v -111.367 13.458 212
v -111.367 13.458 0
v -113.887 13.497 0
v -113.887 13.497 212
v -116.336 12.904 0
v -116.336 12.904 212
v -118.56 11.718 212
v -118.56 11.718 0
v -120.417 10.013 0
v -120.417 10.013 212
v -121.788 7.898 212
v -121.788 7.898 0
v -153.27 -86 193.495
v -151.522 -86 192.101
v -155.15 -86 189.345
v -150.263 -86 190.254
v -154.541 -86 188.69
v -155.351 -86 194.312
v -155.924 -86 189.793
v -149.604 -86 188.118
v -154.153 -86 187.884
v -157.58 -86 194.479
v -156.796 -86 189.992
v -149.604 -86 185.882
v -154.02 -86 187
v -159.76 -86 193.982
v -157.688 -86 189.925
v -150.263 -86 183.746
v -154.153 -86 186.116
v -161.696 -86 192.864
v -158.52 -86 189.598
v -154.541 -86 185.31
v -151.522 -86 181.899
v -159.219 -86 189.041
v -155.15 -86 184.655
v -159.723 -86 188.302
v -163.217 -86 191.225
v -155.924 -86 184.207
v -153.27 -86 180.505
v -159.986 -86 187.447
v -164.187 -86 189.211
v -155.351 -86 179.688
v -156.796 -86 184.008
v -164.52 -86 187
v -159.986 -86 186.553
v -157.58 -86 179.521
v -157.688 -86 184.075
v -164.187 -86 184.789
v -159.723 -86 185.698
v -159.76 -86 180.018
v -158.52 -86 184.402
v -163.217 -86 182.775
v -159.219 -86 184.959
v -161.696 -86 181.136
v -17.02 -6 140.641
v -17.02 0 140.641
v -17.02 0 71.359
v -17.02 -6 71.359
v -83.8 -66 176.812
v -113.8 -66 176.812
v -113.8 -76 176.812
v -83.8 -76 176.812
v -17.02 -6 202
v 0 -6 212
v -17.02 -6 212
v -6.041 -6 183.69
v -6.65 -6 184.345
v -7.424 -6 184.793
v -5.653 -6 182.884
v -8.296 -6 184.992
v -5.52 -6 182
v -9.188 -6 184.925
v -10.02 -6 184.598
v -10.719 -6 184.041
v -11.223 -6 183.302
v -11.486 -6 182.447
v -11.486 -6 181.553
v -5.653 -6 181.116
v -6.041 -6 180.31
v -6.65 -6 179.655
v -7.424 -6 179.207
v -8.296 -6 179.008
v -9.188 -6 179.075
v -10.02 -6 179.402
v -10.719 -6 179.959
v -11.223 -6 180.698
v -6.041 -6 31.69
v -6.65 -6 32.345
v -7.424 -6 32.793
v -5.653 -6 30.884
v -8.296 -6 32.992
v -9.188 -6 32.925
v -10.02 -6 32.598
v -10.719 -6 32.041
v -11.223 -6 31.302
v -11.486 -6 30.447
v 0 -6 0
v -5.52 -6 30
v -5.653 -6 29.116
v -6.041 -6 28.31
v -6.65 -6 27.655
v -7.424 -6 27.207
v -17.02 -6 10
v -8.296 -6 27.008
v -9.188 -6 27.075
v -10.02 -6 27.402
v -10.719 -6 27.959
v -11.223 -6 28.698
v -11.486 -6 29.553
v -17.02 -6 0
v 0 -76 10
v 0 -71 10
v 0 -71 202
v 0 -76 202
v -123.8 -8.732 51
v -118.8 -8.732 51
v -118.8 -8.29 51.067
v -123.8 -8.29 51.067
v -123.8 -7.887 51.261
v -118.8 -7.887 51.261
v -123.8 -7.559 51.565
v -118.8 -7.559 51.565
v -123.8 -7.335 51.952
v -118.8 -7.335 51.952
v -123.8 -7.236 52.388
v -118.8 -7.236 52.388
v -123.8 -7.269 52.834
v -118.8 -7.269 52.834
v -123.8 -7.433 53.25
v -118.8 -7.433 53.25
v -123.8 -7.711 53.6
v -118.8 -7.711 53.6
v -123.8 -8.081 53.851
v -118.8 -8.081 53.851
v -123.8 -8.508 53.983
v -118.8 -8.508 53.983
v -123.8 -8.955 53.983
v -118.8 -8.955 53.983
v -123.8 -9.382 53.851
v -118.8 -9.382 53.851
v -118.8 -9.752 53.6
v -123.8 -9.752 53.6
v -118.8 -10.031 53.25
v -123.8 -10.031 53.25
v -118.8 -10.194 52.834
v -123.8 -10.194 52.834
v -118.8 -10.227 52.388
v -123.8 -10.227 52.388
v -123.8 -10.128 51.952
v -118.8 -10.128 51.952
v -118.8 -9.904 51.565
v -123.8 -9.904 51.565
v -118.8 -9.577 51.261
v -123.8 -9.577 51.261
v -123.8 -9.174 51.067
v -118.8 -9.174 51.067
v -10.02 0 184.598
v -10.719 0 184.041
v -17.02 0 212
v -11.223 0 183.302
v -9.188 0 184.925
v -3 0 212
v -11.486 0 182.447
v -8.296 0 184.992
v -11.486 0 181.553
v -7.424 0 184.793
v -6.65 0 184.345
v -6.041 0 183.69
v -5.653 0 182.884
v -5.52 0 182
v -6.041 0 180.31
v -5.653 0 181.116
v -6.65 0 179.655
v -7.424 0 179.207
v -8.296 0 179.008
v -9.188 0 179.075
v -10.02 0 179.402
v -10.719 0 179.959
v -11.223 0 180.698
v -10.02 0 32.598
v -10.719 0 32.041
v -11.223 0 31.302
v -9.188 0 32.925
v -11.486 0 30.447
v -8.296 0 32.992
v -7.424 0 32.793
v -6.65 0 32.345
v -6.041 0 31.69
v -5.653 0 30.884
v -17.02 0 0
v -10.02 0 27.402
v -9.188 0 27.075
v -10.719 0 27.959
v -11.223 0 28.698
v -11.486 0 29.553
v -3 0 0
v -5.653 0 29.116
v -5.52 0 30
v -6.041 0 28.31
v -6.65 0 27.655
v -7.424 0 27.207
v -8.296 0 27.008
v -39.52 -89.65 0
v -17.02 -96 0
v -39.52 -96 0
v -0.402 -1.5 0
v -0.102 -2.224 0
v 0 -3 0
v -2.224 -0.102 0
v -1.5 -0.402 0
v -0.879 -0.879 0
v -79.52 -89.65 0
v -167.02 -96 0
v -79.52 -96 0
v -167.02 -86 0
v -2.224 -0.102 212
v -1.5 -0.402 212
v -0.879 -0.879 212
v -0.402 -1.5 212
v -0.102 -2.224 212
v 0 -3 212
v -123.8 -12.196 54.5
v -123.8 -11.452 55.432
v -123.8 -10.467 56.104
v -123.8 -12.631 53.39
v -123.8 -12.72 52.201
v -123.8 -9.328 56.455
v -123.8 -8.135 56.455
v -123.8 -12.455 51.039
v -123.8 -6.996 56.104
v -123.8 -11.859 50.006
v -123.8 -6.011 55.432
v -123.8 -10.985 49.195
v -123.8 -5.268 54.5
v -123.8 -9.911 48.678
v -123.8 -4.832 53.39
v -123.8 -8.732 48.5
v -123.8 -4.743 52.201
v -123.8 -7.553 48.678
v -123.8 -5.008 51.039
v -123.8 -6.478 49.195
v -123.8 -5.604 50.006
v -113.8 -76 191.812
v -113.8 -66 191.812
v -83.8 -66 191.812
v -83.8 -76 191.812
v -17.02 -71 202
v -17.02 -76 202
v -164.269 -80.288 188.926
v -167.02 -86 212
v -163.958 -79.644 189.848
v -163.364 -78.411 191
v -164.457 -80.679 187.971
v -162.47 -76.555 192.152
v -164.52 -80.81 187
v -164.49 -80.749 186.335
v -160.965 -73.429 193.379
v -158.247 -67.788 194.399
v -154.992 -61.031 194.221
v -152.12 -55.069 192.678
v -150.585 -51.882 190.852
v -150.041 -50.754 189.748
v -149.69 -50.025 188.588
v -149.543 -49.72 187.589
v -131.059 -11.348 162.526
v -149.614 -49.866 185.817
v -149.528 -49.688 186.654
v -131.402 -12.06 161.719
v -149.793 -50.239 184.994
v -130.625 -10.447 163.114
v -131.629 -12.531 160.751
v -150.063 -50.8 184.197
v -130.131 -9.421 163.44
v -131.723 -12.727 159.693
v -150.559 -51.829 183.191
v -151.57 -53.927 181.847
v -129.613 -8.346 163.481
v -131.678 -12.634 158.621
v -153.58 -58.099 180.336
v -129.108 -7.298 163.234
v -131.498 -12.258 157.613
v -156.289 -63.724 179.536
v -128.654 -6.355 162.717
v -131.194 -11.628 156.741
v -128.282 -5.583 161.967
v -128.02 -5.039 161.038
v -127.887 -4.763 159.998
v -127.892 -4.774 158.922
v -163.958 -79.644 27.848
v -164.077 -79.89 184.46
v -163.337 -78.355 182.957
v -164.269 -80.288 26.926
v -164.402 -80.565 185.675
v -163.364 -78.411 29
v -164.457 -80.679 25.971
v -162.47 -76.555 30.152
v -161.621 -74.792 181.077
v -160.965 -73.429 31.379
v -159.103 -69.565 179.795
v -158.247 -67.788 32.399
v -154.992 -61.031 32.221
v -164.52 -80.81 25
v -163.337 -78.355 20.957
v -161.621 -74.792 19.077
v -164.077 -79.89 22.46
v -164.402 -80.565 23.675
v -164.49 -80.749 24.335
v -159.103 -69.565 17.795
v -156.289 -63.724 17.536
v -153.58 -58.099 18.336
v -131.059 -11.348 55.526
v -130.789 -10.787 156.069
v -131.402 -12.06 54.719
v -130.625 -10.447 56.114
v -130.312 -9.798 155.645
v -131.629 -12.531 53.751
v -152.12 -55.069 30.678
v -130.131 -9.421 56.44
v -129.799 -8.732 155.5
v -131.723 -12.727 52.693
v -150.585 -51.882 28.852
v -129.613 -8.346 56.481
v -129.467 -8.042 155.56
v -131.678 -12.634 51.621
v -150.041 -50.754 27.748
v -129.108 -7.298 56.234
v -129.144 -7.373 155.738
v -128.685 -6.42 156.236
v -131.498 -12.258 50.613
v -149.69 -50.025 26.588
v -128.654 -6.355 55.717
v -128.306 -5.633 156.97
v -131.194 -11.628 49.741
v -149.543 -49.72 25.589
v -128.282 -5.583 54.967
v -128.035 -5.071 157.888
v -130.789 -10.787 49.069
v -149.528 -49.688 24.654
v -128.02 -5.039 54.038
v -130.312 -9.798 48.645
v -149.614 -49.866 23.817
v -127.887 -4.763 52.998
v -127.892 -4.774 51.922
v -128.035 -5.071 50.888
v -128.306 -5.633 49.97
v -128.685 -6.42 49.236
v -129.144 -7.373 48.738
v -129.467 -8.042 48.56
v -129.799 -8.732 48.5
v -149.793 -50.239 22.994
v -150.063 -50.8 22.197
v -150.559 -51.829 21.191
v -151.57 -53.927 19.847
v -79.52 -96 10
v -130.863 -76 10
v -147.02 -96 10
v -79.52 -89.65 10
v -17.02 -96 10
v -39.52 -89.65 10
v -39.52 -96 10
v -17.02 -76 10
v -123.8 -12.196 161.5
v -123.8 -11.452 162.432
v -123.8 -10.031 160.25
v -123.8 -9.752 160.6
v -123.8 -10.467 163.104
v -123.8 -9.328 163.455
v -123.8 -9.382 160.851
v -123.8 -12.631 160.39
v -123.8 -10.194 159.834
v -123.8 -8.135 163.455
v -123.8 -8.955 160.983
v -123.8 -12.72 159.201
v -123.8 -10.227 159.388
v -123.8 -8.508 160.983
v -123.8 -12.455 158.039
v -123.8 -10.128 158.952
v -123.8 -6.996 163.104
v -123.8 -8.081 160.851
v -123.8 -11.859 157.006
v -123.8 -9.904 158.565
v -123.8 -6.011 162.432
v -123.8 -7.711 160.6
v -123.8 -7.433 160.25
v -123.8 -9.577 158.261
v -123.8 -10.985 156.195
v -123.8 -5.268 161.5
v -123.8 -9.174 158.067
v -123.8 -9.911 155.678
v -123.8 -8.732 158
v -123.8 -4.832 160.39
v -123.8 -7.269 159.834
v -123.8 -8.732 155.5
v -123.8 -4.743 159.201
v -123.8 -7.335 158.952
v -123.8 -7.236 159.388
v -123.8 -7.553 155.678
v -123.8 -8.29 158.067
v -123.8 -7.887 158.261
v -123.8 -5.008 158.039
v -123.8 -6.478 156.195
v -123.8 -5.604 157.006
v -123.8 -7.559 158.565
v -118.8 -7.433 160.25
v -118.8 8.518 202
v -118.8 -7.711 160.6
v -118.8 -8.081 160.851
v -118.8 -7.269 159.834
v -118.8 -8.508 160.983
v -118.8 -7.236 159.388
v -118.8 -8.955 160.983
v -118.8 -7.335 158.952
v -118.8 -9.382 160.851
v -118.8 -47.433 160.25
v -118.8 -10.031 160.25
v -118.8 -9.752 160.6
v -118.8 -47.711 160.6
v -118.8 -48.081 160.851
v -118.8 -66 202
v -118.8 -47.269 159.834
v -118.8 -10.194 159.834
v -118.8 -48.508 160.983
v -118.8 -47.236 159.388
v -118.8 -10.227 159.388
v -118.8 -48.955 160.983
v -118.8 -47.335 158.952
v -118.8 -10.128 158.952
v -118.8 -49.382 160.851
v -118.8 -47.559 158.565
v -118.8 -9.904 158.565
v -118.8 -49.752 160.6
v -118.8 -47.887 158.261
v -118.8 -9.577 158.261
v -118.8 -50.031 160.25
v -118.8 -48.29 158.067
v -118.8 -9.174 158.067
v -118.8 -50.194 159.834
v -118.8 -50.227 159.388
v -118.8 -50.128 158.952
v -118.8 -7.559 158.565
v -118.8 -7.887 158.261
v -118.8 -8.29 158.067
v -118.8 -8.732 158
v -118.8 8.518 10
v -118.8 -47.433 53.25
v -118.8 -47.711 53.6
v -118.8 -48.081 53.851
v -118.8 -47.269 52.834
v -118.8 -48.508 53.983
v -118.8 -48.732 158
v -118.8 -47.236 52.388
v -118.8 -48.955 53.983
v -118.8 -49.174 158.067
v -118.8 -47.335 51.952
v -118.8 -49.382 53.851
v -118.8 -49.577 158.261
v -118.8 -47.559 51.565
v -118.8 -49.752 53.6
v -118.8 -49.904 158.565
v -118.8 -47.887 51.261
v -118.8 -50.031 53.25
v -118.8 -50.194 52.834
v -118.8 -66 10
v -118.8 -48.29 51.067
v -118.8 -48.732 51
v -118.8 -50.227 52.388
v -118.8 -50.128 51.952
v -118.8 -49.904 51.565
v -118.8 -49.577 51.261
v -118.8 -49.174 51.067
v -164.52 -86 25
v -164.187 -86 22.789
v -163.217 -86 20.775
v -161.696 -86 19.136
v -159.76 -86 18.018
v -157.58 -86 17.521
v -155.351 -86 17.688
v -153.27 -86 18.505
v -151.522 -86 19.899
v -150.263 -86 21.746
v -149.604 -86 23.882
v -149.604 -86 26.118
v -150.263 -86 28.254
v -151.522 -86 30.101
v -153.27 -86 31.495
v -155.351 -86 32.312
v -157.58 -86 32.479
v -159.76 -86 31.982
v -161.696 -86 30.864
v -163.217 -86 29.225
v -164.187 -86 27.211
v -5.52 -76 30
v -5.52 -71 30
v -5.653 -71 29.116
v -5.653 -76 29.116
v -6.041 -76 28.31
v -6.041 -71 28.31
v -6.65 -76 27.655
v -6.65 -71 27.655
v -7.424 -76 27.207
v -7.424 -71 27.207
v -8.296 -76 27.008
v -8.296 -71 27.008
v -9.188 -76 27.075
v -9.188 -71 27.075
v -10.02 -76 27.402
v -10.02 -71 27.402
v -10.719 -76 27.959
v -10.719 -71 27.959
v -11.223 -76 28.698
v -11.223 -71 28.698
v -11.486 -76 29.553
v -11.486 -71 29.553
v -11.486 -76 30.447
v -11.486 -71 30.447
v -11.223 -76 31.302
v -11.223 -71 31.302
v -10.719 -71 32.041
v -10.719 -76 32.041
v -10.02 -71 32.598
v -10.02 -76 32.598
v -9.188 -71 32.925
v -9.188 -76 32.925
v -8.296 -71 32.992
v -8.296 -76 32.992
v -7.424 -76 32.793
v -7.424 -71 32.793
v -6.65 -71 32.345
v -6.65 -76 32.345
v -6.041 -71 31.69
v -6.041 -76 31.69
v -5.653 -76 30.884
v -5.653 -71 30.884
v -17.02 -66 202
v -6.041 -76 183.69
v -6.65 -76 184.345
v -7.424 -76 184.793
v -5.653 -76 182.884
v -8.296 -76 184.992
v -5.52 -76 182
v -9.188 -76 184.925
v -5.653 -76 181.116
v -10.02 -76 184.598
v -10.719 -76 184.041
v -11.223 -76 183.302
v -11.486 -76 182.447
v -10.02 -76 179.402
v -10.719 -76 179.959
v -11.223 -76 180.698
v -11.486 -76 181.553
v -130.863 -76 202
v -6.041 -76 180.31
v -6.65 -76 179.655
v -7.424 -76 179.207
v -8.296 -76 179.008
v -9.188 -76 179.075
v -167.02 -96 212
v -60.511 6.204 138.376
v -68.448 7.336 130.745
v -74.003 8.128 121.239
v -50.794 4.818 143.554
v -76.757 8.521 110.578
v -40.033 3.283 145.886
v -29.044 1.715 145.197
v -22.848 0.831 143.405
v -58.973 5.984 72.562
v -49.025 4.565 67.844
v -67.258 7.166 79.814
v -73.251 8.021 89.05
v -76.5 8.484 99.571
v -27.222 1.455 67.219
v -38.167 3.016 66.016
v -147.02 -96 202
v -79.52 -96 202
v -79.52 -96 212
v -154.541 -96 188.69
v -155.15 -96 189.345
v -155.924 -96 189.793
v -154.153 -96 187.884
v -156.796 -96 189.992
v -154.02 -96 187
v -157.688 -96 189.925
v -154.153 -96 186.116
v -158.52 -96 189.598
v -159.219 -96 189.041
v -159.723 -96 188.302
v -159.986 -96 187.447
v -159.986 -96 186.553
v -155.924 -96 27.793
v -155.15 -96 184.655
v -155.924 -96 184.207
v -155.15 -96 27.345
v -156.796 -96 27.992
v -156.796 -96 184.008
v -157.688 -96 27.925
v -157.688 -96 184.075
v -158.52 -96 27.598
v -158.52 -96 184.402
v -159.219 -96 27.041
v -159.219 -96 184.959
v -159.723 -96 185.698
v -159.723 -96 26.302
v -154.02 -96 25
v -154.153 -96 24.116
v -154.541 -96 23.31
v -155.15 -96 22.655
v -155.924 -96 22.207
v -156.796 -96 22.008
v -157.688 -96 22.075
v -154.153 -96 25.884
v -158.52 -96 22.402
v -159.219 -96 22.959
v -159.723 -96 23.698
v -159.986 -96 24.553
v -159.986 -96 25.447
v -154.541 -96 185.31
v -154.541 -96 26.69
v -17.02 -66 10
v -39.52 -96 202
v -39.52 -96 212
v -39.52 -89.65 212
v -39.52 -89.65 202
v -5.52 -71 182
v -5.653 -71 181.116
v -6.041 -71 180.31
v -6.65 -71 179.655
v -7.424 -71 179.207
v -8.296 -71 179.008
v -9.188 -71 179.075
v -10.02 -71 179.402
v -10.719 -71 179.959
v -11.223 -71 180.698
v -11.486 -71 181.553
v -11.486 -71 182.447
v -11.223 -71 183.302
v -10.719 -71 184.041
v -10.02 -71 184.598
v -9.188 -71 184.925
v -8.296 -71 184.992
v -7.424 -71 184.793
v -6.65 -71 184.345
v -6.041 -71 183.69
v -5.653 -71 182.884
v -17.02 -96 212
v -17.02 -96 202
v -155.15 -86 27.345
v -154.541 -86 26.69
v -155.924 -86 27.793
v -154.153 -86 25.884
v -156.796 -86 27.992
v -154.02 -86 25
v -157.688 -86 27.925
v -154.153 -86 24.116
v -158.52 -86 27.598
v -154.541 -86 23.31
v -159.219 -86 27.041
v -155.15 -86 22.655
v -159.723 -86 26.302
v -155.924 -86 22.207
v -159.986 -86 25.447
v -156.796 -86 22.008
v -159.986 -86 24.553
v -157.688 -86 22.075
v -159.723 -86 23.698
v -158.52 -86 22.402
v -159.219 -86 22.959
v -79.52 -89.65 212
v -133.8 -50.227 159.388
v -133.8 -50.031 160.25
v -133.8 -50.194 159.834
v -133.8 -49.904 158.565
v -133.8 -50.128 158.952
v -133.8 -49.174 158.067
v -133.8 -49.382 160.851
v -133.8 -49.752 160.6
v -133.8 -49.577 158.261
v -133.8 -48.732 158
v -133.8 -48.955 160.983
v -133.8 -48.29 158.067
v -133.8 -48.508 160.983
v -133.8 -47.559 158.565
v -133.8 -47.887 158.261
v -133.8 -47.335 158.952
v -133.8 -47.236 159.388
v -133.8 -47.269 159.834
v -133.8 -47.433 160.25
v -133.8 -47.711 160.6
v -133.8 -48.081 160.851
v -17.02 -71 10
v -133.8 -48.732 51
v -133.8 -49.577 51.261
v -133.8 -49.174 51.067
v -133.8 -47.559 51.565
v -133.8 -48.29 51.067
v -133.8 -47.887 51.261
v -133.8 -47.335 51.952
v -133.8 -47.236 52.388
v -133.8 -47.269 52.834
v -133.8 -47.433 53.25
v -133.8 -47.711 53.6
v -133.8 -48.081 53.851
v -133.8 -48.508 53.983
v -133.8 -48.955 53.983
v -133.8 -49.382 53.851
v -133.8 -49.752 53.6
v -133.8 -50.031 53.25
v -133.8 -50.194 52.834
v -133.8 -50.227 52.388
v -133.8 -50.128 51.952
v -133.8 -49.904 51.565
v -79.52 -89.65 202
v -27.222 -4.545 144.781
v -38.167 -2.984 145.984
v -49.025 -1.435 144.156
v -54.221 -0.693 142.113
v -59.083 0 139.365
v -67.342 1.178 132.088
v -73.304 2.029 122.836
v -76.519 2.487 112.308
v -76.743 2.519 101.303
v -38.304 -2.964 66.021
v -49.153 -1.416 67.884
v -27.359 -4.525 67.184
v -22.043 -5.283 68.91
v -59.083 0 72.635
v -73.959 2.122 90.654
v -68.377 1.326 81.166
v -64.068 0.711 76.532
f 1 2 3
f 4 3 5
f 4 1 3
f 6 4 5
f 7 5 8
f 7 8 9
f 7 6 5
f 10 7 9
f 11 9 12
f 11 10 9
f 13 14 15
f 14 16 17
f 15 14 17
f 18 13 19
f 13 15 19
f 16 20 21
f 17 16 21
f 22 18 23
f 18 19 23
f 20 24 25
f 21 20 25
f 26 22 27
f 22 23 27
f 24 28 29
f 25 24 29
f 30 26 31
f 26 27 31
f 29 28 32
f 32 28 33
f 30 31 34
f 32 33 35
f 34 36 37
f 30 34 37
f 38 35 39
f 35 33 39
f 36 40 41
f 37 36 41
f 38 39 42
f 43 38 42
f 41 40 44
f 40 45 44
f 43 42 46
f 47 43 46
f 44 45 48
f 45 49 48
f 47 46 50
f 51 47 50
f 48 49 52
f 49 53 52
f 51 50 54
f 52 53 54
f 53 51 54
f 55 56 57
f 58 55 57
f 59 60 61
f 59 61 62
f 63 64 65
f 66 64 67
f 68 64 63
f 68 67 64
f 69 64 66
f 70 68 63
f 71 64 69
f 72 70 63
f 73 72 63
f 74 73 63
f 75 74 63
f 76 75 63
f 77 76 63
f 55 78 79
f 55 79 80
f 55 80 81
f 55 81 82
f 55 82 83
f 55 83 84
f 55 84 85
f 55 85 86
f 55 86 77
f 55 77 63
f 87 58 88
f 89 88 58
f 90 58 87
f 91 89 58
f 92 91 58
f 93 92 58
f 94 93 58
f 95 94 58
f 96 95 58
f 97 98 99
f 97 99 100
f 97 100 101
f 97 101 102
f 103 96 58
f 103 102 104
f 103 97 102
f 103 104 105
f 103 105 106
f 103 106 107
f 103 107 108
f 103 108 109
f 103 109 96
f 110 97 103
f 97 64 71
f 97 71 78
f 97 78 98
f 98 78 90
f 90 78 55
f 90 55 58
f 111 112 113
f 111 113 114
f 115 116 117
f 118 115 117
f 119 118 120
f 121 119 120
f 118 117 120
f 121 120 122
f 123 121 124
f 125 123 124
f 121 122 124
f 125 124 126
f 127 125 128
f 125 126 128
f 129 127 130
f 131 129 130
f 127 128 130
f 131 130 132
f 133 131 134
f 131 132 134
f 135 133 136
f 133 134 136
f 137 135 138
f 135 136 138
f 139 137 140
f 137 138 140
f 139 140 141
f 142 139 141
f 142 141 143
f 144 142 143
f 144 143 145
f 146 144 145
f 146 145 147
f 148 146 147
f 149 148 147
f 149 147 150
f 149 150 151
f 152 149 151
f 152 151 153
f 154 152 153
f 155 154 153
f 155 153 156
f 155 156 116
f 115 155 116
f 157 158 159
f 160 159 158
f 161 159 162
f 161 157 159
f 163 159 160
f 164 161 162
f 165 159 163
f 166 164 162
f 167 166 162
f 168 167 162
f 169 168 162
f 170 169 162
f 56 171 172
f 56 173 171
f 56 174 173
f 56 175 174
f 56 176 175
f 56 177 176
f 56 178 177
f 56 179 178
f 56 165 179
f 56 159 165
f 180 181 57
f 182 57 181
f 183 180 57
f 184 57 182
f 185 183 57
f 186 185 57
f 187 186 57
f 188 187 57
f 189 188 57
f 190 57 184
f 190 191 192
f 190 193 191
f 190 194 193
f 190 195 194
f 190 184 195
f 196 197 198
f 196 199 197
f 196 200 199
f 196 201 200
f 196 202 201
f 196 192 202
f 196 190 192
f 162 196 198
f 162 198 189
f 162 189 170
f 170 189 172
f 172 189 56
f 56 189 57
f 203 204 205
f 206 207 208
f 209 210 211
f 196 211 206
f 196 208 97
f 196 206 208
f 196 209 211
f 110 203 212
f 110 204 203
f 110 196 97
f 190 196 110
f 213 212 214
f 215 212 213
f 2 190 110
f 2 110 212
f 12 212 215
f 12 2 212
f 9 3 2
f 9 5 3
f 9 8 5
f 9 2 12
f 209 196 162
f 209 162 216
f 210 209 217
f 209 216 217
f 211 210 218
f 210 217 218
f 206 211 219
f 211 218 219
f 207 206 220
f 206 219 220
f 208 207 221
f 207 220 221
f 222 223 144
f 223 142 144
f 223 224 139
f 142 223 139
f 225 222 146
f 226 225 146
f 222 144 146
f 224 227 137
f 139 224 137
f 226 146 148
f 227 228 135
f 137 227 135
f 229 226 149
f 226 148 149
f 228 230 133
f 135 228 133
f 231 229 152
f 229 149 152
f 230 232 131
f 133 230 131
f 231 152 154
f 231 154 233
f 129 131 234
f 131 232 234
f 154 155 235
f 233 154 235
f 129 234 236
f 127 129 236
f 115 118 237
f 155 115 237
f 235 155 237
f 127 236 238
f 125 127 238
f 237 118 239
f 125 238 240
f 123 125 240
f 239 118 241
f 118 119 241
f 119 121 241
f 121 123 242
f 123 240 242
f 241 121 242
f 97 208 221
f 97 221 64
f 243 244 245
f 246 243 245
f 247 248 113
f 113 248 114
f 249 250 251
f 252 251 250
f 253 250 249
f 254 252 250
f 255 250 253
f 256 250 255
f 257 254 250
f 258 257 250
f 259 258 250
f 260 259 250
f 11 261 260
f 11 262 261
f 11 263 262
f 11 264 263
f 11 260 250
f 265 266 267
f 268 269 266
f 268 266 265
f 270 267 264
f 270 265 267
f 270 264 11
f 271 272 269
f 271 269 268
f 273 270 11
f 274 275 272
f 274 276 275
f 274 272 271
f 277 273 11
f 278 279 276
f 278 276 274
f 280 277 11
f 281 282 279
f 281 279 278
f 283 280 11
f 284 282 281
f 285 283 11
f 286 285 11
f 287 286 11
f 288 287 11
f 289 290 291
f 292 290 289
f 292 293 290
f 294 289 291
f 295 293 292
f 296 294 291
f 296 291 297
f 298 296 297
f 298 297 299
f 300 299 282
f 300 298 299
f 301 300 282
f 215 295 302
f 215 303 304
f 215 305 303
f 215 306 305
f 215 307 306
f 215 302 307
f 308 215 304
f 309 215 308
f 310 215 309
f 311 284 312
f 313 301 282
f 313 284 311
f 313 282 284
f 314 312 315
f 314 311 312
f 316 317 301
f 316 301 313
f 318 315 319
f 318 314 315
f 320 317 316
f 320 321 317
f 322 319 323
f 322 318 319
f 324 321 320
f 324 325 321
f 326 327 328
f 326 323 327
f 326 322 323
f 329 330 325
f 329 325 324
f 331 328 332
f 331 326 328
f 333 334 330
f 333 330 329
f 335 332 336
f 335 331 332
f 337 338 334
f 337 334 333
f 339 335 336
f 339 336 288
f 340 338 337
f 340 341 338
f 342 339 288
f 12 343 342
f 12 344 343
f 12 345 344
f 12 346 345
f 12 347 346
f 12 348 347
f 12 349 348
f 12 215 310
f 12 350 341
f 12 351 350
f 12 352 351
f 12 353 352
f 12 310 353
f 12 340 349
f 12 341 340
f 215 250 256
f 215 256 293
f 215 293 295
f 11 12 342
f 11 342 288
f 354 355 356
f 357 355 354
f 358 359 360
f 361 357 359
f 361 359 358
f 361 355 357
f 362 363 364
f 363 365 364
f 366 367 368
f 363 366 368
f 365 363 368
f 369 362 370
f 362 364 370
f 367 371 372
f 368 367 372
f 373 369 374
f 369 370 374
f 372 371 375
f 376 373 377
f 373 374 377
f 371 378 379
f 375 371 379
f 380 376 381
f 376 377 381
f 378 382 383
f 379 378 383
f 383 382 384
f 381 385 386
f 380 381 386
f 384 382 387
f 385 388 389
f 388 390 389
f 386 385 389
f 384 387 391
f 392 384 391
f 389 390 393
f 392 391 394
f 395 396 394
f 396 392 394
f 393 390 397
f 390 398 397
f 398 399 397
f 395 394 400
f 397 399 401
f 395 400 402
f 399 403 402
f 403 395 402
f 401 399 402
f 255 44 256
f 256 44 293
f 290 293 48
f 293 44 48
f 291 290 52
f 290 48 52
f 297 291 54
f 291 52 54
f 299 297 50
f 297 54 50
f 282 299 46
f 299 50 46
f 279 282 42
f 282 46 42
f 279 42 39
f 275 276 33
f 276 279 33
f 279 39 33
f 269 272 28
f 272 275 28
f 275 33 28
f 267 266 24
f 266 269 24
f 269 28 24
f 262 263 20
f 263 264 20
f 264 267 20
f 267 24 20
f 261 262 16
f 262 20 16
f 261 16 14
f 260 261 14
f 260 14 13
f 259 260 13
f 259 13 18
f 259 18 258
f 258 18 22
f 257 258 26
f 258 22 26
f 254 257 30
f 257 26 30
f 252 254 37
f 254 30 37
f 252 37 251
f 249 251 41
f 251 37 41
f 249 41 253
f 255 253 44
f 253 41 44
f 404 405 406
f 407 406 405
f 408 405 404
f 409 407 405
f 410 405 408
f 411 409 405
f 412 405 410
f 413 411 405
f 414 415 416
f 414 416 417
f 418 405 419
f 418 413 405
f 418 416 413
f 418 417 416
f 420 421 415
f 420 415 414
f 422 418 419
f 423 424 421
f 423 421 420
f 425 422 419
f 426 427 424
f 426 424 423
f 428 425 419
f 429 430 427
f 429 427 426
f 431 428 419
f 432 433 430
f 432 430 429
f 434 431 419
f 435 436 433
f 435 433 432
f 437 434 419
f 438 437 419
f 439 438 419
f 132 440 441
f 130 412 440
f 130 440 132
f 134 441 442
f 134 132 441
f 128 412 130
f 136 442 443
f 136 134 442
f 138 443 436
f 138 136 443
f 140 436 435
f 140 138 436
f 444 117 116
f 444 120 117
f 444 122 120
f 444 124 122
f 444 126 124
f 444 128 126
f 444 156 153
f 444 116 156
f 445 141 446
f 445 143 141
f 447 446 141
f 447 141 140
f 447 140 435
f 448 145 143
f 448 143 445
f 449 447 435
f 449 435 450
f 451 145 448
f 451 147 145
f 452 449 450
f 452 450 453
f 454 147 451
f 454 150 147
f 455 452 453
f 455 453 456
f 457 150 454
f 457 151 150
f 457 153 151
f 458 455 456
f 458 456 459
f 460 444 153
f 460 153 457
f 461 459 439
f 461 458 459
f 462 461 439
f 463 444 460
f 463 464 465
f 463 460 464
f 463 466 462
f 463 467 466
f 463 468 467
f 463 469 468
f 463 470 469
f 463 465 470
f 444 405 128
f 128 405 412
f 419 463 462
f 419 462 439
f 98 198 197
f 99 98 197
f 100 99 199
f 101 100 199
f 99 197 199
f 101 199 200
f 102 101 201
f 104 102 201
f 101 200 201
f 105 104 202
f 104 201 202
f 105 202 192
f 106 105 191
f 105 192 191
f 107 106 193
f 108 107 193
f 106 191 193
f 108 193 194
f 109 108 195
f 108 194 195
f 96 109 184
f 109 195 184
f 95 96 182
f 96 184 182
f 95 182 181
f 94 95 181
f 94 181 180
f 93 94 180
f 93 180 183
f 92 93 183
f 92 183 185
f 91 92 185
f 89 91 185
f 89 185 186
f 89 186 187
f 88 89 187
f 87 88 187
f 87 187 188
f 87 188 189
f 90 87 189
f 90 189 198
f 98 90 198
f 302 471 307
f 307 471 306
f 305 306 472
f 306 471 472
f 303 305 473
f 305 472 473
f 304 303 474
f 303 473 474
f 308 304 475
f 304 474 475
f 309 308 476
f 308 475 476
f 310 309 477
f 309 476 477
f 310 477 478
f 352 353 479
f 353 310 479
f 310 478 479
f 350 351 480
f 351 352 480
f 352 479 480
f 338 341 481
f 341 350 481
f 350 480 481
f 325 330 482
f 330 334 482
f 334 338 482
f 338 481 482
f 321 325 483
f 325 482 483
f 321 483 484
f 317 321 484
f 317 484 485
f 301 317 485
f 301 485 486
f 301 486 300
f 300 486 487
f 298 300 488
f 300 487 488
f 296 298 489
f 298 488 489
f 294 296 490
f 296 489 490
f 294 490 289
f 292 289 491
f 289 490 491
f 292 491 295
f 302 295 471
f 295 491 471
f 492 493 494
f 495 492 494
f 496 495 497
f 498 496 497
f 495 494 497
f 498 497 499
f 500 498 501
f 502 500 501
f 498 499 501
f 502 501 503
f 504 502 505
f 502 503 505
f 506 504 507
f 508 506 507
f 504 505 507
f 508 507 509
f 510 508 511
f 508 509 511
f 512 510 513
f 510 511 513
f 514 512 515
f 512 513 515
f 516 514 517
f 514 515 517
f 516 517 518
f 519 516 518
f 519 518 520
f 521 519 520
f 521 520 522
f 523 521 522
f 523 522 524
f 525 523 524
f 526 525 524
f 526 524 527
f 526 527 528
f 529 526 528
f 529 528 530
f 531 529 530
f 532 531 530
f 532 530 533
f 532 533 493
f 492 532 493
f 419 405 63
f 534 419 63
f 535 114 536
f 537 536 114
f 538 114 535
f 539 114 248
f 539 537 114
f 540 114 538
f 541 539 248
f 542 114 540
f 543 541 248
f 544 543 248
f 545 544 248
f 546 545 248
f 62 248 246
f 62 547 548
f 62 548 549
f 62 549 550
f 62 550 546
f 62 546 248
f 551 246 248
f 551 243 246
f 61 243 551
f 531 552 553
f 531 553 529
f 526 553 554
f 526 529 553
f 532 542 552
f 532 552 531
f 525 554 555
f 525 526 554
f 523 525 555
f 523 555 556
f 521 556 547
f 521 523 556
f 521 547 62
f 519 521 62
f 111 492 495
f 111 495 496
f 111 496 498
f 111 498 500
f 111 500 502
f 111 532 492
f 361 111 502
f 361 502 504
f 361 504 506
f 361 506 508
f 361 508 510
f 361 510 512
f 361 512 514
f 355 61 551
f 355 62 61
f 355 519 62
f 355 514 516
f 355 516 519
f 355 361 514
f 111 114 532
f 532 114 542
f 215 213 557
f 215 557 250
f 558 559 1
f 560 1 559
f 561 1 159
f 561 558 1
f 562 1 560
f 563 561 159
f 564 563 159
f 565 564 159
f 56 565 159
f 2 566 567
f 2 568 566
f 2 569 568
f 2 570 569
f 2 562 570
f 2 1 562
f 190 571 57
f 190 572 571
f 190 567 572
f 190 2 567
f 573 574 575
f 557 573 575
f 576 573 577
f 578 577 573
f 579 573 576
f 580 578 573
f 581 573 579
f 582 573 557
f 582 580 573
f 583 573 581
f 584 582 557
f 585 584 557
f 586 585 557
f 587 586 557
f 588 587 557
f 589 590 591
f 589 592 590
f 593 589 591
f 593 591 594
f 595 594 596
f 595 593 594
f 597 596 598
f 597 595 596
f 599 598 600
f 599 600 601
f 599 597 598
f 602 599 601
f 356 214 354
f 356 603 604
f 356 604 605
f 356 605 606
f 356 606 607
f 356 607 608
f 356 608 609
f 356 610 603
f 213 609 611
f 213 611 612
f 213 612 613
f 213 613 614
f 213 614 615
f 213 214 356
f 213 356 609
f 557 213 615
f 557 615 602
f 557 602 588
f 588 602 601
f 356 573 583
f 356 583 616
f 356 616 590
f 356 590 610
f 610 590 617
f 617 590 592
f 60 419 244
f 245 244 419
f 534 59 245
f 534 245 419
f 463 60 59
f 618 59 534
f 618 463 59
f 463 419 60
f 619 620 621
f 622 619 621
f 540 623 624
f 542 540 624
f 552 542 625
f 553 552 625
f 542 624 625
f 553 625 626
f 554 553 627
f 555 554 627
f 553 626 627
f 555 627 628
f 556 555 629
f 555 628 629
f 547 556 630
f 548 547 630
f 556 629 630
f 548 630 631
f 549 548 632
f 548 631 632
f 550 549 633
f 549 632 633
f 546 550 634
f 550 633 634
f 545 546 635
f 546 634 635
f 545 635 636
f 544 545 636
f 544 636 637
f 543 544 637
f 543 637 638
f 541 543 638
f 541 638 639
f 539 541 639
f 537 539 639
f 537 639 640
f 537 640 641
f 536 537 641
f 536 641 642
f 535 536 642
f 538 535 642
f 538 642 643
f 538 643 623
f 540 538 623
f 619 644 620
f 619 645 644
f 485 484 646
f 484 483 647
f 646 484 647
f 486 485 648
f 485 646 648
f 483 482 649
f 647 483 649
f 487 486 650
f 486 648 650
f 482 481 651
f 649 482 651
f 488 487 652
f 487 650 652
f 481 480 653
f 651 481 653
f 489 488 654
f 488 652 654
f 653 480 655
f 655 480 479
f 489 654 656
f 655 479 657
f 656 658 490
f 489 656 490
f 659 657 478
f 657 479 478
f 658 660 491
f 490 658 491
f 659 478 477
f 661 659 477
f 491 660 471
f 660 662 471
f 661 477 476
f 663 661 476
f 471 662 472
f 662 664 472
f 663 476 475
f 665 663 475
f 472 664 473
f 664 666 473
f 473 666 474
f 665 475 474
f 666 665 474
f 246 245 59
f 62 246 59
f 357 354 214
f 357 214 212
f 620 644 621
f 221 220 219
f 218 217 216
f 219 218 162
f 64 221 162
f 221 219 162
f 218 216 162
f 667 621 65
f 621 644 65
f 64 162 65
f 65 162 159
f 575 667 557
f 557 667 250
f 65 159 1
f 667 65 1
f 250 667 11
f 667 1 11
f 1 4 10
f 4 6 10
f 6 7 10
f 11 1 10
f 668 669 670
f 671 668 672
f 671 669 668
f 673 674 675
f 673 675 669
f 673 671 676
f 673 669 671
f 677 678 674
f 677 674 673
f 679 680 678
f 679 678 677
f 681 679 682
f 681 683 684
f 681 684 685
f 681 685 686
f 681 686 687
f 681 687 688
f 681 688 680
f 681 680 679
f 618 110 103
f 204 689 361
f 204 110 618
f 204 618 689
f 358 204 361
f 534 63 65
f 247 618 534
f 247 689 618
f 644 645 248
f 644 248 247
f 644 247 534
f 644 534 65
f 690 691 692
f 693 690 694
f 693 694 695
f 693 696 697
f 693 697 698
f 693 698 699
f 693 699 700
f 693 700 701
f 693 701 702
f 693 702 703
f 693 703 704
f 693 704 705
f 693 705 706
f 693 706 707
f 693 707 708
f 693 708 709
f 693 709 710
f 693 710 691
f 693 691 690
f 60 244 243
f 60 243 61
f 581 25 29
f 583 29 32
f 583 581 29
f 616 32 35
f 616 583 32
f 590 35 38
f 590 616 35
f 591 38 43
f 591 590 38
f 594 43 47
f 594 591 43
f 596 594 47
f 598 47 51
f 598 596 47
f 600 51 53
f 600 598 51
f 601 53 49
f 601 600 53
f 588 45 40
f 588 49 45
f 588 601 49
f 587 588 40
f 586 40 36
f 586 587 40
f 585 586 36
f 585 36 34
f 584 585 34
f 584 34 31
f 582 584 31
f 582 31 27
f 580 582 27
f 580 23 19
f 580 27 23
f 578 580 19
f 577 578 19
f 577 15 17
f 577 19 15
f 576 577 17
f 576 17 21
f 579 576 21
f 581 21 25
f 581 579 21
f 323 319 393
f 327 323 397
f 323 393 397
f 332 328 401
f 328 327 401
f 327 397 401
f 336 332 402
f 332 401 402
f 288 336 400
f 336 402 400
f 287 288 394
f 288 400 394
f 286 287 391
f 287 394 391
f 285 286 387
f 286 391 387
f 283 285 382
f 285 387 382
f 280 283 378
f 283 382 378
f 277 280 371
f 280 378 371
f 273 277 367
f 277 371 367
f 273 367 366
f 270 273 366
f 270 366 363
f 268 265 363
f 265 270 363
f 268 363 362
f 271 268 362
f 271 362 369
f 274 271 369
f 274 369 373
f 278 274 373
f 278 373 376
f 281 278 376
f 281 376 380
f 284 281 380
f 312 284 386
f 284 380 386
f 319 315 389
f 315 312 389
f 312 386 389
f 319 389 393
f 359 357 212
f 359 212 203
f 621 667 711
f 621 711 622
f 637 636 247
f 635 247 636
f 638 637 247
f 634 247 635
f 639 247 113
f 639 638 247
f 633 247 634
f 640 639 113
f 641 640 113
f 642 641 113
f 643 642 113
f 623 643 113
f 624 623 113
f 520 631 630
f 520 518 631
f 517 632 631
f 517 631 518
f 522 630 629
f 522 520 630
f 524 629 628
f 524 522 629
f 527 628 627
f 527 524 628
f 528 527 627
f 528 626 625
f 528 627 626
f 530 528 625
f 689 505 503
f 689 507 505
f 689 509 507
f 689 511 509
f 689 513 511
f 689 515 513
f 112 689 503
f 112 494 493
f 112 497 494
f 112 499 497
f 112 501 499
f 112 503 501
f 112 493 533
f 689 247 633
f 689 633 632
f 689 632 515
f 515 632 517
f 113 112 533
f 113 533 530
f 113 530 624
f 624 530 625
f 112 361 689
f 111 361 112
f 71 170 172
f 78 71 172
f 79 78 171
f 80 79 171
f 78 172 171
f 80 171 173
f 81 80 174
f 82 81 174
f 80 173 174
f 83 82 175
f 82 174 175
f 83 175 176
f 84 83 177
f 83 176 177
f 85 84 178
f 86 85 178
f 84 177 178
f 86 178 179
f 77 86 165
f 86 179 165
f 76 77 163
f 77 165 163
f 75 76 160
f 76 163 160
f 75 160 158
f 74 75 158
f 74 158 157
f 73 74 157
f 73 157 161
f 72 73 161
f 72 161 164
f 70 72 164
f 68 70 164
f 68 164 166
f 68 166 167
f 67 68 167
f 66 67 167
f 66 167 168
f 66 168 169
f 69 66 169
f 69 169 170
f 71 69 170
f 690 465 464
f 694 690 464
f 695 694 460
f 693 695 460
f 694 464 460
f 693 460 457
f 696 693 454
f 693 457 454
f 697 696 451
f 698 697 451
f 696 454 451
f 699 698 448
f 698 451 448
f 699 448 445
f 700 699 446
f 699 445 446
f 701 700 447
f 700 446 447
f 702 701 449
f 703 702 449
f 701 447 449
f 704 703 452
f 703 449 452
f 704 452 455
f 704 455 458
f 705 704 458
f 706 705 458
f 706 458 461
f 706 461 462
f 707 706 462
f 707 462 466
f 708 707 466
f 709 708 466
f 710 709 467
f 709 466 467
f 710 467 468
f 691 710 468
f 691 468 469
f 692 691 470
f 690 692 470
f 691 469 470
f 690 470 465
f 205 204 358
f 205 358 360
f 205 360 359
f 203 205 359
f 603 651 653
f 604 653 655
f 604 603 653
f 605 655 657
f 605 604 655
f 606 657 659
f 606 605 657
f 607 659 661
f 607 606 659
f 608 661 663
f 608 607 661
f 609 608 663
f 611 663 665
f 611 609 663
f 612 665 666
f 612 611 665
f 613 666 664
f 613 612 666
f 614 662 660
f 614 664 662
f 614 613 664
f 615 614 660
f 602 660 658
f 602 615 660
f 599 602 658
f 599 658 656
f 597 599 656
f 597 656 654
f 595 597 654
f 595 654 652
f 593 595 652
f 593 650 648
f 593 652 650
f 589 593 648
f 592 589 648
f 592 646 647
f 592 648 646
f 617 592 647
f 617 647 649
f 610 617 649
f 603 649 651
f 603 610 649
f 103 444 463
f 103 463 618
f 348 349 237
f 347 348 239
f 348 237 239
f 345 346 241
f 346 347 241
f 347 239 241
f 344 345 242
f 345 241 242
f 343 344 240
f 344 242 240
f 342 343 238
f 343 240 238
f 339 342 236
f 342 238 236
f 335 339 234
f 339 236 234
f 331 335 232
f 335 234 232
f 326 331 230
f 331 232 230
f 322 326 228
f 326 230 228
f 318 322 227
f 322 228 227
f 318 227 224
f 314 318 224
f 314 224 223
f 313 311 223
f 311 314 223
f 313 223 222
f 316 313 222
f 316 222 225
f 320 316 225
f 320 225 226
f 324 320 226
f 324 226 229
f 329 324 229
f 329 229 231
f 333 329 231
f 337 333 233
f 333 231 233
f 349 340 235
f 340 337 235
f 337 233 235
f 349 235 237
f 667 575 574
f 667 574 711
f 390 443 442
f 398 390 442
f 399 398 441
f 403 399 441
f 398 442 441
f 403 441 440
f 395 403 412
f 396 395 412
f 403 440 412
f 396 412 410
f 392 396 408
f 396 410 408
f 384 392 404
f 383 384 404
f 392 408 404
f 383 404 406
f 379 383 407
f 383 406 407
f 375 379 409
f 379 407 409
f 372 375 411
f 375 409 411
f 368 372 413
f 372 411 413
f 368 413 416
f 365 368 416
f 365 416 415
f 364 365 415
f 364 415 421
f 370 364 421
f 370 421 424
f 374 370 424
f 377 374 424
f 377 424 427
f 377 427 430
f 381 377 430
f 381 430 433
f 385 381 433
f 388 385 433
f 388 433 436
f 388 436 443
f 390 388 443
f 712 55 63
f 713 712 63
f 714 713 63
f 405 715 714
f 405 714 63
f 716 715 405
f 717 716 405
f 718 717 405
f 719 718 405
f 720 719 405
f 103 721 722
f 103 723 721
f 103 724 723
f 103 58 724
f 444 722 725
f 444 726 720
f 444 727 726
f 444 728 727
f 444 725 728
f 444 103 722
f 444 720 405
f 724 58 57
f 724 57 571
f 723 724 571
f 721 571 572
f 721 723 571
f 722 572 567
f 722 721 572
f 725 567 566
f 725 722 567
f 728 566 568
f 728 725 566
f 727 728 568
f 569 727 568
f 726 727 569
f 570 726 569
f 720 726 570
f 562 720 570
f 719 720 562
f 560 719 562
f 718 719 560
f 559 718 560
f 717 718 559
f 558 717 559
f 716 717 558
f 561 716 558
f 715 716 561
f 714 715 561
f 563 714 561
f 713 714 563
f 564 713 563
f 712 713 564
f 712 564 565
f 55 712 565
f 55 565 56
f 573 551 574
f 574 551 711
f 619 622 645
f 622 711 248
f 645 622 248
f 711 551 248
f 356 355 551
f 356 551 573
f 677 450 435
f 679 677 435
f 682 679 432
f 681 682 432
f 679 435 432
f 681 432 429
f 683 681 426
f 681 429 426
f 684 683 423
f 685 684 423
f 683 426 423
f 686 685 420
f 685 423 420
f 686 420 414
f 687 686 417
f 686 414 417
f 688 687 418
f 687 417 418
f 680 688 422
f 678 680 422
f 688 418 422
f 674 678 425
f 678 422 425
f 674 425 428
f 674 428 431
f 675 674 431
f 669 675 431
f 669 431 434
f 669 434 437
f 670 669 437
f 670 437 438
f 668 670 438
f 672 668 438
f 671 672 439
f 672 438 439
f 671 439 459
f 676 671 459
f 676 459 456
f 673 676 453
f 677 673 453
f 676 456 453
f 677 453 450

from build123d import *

# Parameters (mm, degrees)
BOSS_EXTRUDE1_DEPTH     = 212
CUT_EXTRUDE1_REACH      = 92.491
SKETCH2_W               = 17.02
SKETCH2_H               = 10
SKETCH3_R               = 1.5
CUT_EXTRUDE2_DEPTH      = 15
SKETCH4_R               = 3
CUT_EXTRUDE3_DEPTH      = 111.491488024
CUT_EXTRUDE3_DEPTH_BACK = 1
SKETCH5_W               = 30
SKETCH5_H               = 15
CUT_EXTRUDE4_DEPTH      = 15
SKETCH6_R               = 3
CUT_EXTRUDE5_DEPTH      = 15.491488024
CUT_EXTRUDE5_DEPTH_BACK = 97
BOSS_EXTRUDE2_DEPTH     = 10
BOSS_EXTRUDE3_DEPTH     = 10
SKETCH9_W               = 40
SKETCH9_H               = 6.35
CUT_EXTRUDE6_DEPTH      = 1
CUT_EXTRUDE6_DEPTH_BACK = 213
CUT_EXTRUDE9_DEPTH      = 25
CUT_EXTRUDE9_DEPTH_BACK = 27
SKETCH11_R              = 7.5
CUT_EXTRUDE10_DEPTH     = 101.491488024
SKETCH12_R              = 4
CUT_EXTRUDE11_DEPTH     = 44.22
FILLET2_R               = 10
FILLET3_R               = 3


with BuildPart() as part:
    # Sketch1 → Boss-Extrude1 (new body)
    with BuildSketch(Plane.XY):
        Polygon((0, 0), (0, -6), (-17.02, -6), (-118.8, 8.518342212), (-118.8, -66), (-17.02, -66), (-17.02, -71), (0, -71), (0, -76), (-130.862615106, -76), (-147.02, -96), (-167.02, -96), (-167.02, -86), (-118.611740262, 14.491488024), (-17.02, 0), align=None)
    extrude(amount=BOSS_EXTRUDE1_DEPTH)

    # Sketch2 → Cut-Extrude1 (cut, up to next)
    with BuildSketch(Plane.XZ.offset(76), mode=Mode.PRIVATE) as cut_extrude1_sk1:
        with Locations((-8.51, 207)):
            Rectangle(SKETCH2_W, SKETCH2_H)
    cut_extrude1_tool1 = extrude(cut_extrude1_sk1.sketch, amount=-CUT_EXTRUDE1_REACH, mode=Mode.PRIVATE) & part.part
    add(cut_extrude1_tool1.solids().sort_by_distance((-8.51, -76, 207))[0], mode=Mode.SUBTRACT)
    # Sketch2 → Cut-Extrude1 (cut, up to next)
    with BuildSketch(Plane.XZ.offset(76), mode=Mode.PRIVATE) as cut_extrude1_sk2:
        with Locations((-8.51, 5)):
            Rectangle(SKETCH2_W, SKETCH2_H)
    cut_extrude1_tool2 = extrude(cut_extrude1_sk2.sketch, amount=-CUT_EXTRUDE1_REACH, mode=Mode.PRIVATE) & part.part
    add(cut_extrude1_tool2.solids().sort_by_distance((-8.51, -76, 5))[0], mode=Mode.SUBTRACT)

    # Sketch3 → Cut-Extrude2 (cut)
    with BuildSketch(Plane(origin=(-118.8, 0, 0), x_dir=(0, 0, -1), z_dir=(1, 0, 0))):
        with Locations((-159.5, -8.731657788)):
            Circle(SKETCH3_R)
        with Locations((-159.5, -48.731657788)):
            Circle(SKETCH3_R)
        with Locations((-52.5, -48.731657788)):
            Circle(SKETCH3_R)
        with Locations((-52.5, -8.731657788)):
            Circle(SKETCH3_R)
    extrude(amount=-CUT_EXTRUDE2_DEPTH, mode=Mode.SUBTRACT)

    # Sketch4 → Cut-Extrude3 (cut, two sides)
    with BuildSketch(Plane(origin=(0, -96, 0), x_dir=(1, 0, 0), z_dir=(0, 1, 0))) as cut_extrude3_sk:
        with Locations((-157.02, -187)):
            Circle(SKETCH4_R)
        with Locations((-157.02, -25)):
            Circle(SKETCH4_R)
    extrude(amount=CUT_EXTRUDE3_DEPTH, mode=Mode.SUBTRACT)
    extrude(cut_extrude3_sk.sketch, amount=-CUT_EXTRUDE3_DEPTH_BACK, mode=Mode.SUBTRACT)

    # Sketch5 → Cut-Extrude4 (cut)
    with BuildSketch(Plane(origin=(0, -66, 0), x_dir=(1, 0, 0), z_dir=(0, 1, 0))):
        with Locations((-98.8, -184.31184426)):
            Rectangle(SKETCH5_W, SKETCH5_H)
    extrude(amount=-CUT_EXTRUDE4_DEPTH, mode=Mode.SUBTRACT)

    # Sketch6 → Cut-Extrude5 (cut, two sides)
    with BuildSketch(Plane(origin=(0, 0, 0), x_dir=(1, 0, 0), z_dir=(0, 1, 0))) as cut_extrude5_sk:
        with Locations((-8.52, -30)):
            Circle(SKETCH6_R)
        with Locations((-8.52, -182)):
            Circle(SKETCH6_R)
    extrude(amount=CUT_EXTRUDE5_DEPTH, mode=Mode.SUBTRACT)
    extrude(cut_extrude5_sk.sketch, amount=-CUT_EXTRUDE5_DEPTH_BACK, mode=Mode.SUBTRACT)

    # Sketch7 → Boss-Extrude2 (add)
    with BuildSketch(Plane.XY.offset(212)):
        Polygon((-17.02, 0), (-118.611740262, 14.491488024), (-167.02, -86), (-167.02, -96), (-17.02, -96), align=None)
    extrude(amount=-BOSS_EXTRUDE2_DEPTH)

    # Sketch8 → Boss-Extrude3 (add)
    with BuildSketch(Plane(origin=(0, 0, 0), x_dir=(-1, 0, 0), z_dir=(0, 0, -1))):
        Polygon((167.02, -86), (167.02, -96), (17.02, -96), (17.02, 0), (118.611740262, 14.491488024), align=None)
    extrude(amount=-BOSS_EXTRUDE3_DEPTH)

    # Sketch9 → Cut-Extrude6 (cut, two sides)
    with BuildSketch(Plane.XY.offset(212)) as cut_extrude6_sk:
        with Locations((-59.52, -92.825)):
            Rectangle(SKETCH9_W, SKETCH9_H)
    extrude(amount=CUT_EXTRUDE6_DEPTH, mode=Mode.SUBTRACT)
    extrude(cut_extrude6_sk.sketch, amount=-CUT_EXTRUDE6_DEPTH_BACK, mode=Mode.SUBTRACT)

    # Sketch10 → Cut-Extrude9 (cut, two sides)
    with BuildSketch(Plane(origin=(0, 0, 0), x_dir=(1, 0, 0), z_dir=(0, 1, 0))) as cut_extrude9_sk:
        with BuildLine():
            Line((-17.02, -140.641016151), (-17.02, -71.358983849))
            ThreePointArc((-17.02, -71.358983849), (-77.02, -106), (-17.02, -140.641016151))
        make_face()
    extrude(amount=CUT_EXTRUDE9_DEPTH, mode=Mode.SUBTRACT)
    extrude(cut_extrude9_sk.sketch, amount=-CUT_EXTRUDE9_DEPTH_BACK, mode=Mode.SUBTRACT)

    # Sketch11 → Cut-Extrude10 (cut, through all)
    with BuildSketch(Plane(origin=(0, -86, 0), x_dir=(-1, 0, 0), z_dir=(0, -1, 0))):
        with Locations((157.02, -25)):
            Circle(SKETCH11_R)
        with Locations((157.02, -187)):
            Circle(SKETCH11_R)
    extrude(amount=-CUT_EXTRUDE10_DEPTH, mode=Mode.SUBTRACT)

    # Sketch12 → Cut-Extrude11 (cut, through all)
    with BuildSketch(Plane(origin=(-123.8, 0, 0), x_dir=(0, 0, -1), z_dir=(1, 0, 0))):
        with Locations((-159.5, -8.731657788)):
            Circle(SKETCH12_R)
        with Locations((-52.5, -8.731657788)):
            Circle(SKETCH12_R)
    extrude(amount=-CUT_EXTRUDE11_DEPTH, mode=Mode.SUBTRACT)

    # Fillet2
    fillet2_edges = [part.edges().sort_by_distance(p)[0] for p in [
        (-118.611740262, 14.491488024, 106),
    ]]
    fillet(fillet2_edges, radius=FILLET2_R)

    # Fillet3
    fillet3_edges = [part.edges().sort_by_distance(p)[0] for p in [
        (0, 0, 106),
    ]]
    fillet(fillet3_edges, radius=FILLET3_R)


solid = part.part
